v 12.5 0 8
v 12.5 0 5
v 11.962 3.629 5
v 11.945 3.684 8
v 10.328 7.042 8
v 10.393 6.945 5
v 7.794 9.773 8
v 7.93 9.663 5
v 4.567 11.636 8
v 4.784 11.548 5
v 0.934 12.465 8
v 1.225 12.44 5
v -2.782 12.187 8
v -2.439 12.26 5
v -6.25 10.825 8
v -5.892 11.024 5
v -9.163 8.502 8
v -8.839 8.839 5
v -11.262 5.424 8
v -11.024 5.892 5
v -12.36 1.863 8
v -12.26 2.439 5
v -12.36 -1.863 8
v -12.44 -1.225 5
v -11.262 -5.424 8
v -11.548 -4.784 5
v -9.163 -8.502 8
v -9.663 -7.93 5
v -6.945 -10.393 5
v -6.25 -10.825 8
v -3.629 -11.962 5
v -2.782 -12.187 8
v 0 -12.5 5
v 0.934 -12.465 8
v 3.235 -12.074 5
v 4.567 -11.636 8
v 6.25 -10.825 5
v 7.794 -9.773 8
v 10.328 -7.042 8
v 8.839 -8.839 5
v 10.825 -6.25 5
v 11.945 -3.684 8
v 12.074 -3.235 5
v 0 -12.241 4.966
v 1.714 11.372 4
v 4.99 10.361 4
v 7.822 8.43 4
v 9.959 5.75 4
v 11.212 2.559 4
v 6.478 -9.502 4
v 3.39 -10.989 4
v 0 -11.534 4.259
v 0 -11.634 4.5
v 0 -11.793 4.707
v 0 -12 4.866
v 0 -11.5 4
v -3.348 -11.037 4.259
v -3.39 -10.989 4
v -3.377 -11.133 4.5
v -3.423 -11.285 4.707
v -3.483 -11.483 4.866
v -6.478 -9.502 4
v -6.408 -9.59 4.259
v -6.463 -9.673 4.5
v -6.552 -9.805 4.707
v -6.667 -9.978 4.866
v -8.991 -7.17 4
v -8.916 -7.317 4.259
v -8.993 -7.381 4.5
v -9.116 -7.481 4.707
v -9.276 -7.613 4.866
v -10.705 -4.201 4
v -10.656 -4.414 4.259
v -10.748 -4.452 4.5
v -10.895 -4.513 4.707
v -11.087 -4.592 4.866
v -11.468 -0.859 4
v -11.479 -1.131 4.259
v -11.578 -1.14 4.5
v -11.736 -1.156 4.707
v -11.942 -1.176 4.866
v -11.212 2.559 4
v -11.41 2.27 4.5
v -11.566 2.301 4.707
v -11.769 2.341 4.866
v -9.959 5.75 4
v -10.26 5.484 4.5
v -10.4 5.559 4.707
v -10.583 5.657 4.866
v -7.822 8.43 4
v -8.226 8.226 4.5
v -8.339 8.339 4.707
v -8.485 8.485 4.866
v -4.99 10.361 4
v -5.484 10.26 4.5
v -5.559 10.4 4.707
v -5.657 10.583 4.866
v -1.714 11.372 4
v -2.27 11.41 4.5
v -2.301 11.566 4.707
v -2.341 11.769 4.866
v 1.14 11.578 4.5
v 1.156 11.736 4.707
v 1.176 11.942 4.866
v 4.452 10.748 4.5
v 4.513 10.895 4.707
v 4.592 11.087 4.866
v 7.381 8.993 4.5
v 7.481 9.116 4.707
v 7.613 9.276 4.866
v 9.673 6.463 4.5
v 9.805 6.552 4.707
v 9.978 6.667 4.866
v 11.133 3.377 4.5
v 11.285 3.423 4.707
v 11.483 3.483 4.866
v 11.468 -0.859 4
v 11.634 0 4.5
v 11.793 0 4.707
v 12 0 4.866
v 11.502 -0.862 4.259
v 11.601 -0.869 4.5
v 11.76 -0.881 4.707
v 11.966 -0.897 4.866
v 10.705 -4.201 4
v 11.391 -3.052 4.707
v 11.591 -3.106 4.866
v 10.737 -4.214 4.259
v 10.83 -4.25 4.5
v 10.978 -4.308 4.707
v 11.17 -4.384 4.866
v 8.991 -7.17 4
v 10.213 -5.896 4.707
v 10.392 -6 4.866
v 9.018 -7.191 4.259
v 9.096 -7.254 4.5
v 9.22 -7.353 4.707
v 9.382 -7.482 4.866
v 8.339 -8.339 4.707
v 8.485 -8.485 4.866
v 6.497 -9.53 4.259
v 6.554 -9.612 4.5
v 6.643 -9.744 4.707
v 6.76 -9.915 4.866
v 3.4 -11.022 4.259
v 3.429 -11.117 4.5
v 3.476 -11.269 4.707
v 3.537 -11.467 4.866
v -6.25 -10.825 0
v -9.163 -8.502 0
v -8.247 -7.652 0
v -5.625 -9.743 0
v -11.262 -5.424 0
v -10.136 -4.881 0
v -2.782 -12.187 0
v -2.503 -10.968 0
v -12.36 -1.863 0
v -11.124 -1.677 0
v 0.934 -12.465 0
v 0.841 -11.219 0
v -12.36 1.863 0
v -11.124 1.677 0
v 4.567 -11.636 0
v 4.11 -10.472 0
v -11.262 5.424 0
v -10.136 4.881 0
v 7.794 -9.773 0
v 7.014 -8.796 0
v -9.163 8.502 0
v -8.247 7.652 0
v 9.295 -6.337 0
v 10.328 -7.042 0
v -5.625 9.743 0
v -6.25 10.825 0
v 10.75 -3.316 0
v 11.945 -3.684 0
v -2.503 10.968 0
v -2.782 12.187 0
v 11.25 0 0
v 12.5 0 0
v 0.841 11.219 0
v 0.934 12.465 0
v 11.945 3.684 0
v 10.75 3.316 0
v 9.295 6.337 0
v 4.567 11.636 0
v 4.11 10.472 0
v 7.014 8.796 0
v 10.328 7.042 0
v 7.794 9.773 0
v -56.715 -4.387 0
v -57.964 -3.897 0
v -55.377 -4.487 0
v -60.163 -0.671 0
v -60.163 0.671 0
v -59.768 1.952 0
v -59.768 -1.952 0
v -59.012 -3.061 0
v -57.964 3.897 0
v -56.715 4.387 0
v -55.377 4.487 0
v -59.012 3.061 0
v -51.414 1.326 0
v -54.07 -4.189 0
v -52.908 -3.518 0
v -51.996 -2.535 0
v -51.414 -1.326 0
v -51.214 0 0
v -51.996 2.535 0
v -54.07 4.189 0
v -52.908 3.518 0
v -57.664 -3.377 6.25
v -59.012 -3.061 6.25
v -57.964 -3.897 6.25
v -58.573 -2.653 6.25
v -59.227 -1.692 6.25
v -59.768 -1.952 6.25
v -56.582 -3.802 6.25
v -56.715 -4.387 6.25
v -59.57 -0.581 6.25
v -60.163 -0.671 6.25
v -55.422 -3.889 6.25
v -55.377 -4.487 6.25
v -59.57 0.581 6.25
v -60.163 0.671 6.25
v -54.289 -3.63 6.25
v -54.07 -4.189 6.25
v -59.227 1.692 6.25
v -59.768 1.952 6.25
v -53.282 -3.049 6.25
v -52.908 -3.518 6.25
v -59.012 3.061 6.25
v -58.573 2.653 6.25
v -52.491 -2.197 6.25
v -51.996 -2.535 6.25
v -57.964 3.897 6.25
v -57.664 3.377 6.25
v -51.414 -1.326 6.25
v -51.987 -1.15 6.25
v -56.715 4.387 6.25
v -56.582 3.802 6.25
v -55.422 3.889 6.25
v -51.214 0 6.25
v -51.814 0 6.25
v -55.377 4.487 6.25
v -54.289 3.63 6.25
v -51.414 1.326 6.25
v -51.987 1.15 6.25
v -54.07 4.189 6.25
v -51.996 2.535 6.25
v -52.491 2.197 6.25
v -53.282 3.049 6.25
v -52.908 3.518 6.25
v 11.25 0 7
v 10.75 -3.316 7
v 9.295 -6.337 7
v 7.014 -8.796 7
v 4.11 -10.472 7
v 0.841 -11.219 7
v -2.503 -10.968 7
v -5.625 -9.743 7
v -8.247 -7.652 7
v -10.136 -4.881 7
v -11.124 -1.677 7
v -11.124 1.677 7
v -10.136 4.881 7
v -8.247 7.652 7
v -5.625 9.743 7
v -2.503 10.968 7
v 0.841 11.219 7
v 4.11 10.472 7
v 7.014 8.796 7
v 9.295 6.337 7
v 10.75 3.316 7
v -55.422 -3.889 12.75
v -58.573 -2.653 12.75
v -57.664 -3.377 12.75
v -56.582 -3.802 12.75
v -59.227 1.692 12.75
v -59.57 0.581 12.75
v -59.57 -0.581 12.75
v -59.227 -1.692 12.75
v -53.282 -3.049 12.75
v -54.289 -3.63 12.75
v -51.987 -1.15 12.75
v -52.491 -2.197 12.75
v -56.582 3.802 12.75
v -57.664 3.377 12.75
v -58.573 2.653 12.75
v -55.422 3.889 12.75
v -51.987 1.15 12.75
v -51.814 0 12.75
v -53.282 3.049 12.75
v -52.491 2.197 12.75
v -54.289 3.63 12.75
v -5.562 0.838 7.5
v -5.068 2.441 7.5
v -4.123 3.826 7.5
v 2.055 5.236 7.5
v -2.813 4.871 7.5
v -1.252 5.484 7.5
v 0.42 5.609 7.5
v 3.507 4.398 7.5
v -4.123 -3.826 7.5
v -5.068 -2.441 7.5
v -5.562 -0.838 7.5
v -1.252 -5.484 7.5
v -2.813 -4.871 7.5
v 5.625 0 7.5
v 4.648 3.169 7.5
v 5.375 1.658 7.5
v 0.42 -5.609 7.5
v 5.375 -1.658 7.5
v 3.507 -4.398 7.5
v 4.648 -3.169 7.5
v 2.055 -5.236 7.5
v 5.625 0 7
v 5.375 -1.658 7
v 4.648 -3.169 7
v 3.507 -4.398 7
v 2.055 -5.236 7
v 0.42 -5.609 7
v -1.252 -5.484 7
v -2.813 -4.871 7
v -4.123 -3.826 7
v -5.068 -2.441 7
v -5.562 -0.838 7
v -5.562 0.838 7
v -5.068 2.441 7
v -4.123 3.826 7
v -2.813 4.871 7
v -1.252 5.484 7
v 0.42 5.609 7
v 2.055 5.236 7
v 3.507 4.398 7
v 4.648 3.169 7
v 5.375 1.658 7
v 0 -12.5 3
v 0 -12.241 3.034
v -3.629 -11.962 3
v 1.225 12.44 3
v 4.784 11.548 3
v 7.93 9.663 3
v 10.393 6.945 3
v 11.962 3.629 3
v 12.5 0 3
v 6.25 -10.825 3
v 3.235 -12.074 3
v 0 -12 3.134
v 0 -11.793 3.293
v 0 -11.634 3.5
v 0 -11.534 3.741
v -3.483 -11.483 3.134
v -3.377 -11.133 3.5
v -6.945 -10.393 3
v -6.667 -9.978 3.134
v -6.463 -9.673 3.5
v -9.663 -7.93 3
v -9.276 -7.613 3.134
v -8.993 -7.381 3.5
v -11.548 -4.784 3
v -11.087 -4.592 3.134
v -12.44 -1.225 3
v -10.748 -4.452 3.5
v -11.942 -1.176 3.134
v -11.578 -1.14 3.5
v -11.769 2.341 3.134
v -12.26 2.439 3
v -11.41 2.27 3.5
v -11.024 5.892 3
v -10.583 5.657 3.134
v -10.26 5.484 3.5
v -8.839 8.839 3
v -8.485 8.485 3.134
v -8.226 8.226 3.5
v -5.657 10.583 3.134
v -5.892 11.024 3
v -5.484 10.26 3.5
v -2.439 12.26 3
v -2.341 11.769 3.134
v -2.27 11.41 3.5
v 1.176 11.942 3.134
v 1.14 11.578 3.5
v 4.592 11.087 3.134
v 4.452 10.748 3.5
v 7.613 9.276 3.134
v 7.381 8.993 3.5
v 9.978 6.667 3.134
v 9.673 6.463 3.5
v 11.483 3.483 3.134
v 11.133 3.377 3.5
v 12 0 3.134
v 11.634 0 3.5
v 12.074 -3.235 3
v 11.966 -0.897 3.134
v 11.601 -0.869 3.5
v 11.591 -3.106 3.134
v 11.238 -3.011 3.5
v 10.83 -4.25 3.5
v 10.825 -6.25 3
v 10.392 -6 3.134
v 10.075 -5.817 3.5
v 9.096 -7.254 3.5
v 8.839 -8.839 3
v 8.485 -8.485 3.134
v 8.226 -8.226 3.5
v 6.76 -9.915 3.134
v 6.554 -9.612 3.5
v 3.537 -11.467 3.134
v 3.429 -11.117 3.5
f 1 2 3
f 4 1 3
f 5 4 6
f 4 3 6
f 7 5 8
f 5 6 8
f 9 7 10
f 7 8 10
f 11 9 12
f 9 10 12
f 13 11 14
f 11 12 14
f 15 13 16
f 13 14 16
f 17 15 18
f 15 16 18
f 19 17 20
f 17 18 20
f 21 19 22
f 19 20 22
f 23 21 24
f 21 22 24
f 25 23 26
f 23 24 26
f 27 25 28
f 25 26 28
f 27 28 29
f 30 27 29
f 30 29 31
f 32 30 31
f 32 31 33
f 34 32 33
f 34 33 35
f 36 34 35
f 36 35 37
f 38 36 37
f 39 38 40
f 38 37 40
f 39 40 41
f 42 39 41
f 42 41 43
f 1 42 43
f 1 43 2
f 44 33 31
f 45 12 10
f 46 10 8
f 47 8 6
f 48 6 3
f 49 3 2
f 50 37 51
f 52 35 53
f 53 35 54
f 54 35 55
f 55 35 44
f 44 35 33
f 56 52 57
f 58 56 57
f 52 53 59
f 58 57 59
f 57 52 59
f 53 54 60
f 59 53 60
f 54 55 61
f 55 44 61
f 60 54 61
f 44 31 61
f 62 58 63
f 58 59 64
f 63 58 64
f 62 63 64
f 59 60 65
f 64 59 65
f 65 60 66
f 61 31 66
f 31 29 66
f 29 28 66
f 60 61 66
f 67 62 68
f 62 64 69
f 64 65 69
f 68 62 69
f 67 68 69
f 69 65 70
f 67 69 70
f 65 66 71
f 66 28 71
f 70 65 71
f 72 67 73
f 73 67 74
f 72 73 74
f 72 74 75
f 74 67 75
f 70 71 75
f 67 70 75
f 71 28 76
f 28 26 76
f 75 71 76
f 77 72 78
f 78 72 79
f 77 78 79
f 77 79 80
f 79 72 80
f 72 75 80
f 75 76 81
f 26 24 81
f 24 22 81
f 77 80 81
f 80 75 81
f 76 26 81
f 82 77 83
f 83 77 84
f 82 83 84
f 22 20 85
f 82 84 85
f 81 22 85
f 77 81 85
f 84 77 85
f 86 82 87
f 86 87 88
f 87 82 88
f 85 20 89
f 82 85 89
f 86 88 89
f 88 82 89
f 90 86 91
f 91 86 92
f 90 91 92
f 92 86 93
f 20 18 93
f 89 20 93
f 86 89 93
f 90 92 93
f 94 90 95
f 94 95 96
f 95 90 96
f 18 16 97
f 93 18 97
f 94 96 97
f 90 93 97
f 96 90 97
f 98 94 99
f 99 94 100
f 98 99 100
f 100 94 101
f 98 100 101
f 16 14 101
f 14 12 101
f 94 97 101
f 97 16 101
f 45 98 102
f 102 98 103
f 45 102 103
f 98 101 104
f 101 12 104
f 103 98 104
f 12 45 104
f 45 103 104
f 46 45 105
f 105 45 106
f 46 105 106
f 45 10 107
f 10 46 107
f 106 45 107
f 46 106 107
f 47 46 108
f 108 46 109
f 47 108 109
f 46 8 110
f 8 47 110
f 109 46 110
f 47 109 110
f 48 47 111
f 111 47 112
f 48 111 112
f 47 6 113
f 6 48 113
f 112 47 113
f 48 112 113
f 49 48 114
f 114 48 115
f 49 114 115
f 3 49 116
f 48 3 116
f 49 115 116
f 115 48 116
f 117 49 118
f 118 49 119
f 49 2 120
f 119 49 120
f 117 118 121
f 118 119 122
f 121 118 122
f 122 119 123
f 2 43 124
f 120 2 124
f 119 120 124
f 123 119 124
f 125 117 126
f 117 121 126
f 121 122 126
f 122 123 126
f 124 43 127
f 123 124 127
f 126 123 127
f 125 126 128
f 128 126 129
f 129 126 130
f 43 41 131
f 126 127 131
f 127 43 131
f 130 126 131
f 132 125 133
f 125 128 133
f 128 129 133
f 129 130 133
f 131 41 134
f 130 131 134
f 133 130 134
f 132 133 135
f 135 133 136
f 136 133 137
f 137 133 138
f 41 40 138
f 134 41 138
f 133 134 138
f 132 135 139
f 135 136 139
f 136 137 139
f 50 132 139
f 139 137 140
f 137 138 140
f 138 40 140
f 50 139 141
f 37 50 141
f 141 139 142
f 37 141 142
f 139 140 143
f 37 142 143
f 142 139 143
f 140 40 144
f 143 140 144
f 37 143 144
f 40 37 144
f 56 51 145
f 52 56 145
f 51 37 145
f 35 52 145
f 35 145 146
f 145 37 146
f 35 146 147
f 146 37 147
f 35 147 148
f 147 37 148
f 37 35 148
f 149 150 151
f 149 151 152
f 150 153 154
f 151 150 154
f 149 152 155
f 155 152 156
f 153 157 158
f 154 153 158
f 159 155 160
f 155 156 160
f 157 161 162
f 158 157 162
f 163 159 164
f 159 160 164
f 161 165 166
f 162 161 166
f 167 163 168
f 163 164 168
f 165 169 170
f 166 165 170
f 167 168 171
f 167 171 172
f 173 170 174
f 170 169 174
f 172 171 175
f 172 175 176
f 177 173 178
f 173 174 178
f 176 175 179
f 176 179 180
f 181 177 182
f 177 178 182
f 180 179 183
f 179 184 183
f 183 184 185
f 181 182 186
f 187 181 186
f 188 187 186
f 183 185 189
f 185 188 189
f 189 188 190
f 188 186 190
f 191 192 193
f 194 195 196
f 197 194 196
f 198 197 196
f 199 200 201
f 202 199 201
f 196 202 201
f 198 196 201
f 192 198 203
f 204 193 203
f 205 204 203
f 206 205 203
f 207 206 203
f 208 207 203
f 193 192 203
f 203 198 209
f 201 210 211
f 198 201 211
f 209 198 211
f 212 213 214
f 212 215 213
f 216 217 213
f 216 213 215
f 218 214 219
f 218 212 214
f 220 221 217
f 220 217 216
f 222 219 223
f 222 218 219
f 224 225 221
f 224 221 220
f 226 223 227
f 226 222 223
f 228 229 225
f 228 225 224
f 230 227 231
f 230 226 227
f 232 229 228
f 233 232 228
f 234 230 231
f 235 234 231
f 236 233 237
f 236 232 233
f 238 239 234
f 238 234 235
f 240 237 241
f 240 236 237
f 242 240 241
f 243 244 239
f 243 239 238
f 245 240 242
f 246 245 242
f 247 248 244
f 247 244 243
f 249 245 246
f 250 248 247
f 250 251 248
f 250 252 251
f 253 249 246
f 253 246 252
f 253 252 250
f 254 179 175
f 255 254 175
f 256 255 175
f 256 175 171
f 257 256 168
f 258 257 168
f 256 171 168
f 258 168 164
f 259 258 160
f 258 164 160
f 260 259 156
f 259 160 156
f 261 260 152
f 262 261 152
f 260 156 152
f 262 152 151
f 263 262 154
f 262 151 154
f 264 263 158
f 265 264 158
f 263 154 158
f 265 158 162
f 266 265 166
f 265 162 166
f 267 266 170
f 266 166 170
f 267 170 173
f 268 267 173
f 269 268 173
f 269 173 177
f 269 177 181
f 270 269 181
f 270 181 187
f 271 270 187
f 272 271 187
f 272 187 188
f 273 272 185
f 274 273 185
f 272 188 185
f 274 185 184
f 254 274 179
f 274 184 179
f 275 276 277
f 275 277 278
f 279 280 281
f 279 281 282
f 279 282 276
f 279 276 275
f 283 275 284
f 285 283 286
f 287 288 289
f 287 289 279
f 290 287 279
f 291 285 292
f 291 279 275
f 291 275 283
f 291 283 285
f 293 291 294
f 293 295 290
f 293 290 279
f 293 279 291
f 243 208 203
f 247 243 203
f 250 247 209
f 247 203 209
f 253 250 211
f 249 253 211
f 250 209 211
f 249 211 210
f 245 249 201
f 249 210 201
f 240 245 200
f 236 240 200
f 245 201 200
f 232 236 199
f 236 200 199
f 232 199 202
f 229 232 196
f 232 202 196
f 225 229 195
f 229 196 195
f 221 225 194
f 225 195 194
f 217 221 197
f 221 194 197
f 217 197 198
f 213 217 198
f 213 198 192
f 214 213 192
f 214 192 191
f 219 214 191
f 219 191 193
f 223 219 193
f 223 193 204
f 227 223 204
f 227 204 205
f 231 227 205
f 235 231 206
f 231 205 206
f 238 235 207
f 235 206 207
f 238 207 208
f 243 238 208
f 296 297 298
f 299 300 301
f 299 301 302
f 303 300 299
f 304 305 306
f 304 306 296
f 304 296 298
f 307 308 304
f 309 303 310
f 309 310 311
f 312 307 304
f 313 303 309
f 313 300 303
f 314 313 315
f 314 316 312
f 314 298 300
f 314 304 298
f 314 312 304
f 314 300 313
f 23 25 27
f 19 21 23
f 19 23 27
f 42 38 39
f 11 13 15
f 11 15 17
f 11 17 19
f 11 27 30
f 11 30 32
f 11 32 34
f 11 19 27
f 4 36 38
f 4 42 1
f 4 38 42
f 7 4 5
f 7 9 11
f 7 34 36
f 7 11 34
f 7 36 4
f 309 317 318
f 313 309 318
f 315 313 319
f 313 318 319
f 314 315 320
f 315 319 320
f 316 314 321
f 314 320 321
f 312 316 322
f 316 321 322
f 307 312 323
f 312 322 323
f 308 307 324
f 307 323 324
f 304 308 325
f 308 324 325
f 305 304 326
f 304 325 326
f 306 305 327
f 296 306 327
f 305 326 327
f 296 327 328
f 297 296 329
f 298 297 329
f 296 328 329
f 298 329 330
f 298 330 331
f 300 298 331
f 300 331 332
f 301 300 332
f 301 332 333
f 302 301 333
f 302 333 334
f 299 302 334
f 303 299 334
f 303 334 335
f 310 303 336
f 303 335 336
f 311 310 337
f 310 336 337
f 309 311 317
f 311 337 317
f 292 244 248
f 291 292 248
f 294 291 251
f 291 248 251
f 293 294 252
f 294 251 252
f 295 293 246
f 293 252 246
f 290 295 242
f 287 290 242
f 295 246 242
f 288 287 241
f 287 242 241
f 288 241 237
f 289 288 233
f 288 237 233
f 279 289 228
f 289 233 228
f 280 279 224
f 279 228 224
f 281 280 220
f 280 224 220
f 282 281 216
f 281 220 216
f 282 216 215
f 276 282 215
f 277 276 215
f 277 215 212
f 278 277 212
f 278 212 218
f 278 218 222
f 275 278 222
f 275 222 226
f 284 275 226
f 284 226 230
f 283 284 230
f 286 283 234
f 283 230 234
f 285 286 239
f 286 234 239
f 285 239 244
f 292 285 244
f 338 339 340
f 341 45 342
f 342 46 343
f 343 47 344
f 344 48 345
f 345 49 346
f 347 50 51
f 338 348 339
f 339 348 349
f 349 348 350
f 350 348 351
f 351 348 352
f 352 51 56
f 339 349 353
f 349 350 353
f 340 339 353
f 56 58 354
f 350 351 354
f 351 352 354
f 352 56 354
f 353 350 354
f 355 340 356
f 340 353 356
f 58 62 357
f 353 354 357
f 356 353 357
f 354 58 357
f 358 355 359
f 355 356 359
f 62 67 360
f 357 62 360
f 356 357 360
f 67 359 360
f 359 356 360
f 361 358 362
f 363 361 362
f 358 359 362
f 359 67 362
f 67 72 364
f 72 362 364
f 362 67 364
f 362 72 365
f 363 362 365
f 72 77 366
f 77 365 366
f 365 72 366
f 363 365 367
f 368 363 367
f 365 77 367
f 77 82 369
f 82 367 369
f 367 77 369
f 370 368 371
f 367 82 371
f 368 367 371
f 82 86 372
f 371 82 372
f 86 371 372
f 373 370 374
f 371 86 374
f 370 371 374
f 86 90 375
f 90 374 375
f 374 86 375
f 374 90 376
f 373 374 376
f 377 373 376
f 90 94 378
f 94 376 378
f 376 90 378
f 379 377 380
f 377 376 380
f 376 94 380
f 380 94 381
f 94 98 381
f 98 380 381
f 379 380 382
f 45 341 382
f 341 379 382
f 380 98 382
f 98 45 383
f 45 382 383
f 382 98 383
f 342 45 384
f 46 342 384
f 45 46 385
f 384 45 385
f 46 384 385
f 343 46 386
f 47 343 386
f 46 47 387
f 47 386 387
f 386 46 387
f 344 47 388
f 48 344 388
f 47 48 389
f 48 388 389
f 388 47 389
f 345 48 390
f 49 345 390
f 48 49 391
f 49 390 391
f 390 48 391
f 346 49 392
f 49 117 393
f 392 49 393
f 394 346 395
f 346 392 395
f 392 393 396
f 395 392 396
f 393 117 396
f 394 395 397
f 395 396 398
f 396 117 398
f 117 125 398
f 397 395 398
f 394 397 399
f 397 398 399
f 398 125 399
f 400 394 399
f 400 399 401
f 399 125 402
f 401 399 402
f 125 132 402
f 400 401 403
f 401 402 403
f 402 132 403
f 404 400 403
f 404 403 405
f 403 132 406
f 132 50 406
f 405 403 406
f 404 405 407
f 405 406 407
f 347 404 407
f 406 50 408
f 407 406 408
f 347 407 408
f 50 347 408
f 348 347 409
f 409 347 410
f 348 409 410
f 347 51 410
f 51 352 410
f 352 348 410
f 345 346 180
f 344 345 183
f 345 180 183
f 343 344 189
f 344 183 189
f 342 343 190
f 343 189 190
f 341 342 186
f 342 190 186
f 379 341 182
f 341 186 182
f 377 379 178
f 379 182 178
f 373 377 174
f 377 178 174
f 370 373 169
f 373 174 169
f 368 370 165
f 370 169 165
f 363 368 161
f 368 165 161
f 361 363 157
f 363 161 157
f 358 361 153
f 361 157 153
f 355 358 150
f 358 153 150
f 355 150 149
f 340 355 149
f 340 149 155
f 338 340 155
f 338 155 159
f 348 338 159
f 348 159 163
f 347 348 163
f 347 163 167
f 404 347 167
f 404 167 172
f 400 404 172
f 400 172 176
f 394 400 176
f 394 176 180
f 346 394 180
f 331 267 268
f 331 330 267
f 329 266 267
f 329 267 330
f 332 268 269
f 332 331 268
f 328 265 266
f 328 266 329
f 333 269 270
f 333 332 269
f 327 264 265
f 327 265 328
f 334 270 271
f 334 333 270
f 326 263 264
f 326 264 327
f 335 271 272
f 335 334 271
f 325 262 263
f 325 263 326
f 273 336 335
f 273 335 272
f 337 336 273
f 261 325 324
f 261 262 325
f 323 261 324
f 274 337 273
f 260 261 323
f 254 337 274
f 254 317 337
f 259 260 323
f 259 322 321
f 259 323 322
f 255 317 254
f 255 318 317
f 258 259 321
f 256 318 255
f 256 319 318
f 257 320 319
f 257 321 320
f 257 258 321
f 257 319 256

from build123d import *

# Parameters (mm, degrees)
F0_R      = 12.5
F1_DEPTH  = 8
F2_R      = 1
F4_R      = 11.25
F5_DEPTH  = 7
F6_R      = 5.625
F7_DEPTH  = 0.5
F8_R      = 4.5
F9_DEPTH  = 6.25
F10_R     = 3.9
F11_DEPTH = 6.5


with BuildPart() as f1:
    # F0 (on Top) → F1 (new body)
    with BuildSketch(Plane.XY):
        Circle(F0_R)
    extrude(amount=F1_DEPTH)

    # F3: sweep along a path in F3_path
    with BuildLine(Plane(origin=(12.5, 0, 0), x_dir=(0, -1, 0), z_dir=(0, 0, -1))) as f3_path:
        CenterArc((0, 12.5), 12.5, 0, 360)
    # F2 (on Front) → F3 (sweep, cut)
    with BuildSketch(Plane.XZ):
        with Locations((-12.5, 4)):
            Circle(F2_R)
    sweep(path=f3_path.line, mode=Mode.SUBTRACT)

    # F4 (on face) → F5 (cut)
    with BuildSketch(Plane(origin=(0, 0, 0), x_dir=(1, 0, 0), z_dir=(0, 0, -1))):
        Circle(F4_R)
    extrude(amount=-F5_DEPTH, mode=Mode.SUBTRACT)

    # F6 (on face) → F7 (cut)
    with BuildSketch(Plane(origin=(0, 0, 7), x_dir=(1, 0, 0), z_dir=(0, 0, -1))):
        Circle(F6_R)
    extrude(amount=-F7_DEPTH, mode=Mode.SUBTRACT)


with BuildPart() as f9:
    # F8 (on Top) → F9 (new body)
    with BuildSketch(Plane.XY):
        with Locations((-55.7136684656, 0)):
            Circle(F8_R)
    extrude(amount=F9_DEPTH)

    # F10 (on face) → F11 (join)
    with BuildSketch(Plane.XY.offset(6.25)):
        with Locations((-55.7136684656, 0)):
            Circle(F10_R)
    extrude(amount=F11_DEPTH)


solid = Compound([f1.part, f9.part])
